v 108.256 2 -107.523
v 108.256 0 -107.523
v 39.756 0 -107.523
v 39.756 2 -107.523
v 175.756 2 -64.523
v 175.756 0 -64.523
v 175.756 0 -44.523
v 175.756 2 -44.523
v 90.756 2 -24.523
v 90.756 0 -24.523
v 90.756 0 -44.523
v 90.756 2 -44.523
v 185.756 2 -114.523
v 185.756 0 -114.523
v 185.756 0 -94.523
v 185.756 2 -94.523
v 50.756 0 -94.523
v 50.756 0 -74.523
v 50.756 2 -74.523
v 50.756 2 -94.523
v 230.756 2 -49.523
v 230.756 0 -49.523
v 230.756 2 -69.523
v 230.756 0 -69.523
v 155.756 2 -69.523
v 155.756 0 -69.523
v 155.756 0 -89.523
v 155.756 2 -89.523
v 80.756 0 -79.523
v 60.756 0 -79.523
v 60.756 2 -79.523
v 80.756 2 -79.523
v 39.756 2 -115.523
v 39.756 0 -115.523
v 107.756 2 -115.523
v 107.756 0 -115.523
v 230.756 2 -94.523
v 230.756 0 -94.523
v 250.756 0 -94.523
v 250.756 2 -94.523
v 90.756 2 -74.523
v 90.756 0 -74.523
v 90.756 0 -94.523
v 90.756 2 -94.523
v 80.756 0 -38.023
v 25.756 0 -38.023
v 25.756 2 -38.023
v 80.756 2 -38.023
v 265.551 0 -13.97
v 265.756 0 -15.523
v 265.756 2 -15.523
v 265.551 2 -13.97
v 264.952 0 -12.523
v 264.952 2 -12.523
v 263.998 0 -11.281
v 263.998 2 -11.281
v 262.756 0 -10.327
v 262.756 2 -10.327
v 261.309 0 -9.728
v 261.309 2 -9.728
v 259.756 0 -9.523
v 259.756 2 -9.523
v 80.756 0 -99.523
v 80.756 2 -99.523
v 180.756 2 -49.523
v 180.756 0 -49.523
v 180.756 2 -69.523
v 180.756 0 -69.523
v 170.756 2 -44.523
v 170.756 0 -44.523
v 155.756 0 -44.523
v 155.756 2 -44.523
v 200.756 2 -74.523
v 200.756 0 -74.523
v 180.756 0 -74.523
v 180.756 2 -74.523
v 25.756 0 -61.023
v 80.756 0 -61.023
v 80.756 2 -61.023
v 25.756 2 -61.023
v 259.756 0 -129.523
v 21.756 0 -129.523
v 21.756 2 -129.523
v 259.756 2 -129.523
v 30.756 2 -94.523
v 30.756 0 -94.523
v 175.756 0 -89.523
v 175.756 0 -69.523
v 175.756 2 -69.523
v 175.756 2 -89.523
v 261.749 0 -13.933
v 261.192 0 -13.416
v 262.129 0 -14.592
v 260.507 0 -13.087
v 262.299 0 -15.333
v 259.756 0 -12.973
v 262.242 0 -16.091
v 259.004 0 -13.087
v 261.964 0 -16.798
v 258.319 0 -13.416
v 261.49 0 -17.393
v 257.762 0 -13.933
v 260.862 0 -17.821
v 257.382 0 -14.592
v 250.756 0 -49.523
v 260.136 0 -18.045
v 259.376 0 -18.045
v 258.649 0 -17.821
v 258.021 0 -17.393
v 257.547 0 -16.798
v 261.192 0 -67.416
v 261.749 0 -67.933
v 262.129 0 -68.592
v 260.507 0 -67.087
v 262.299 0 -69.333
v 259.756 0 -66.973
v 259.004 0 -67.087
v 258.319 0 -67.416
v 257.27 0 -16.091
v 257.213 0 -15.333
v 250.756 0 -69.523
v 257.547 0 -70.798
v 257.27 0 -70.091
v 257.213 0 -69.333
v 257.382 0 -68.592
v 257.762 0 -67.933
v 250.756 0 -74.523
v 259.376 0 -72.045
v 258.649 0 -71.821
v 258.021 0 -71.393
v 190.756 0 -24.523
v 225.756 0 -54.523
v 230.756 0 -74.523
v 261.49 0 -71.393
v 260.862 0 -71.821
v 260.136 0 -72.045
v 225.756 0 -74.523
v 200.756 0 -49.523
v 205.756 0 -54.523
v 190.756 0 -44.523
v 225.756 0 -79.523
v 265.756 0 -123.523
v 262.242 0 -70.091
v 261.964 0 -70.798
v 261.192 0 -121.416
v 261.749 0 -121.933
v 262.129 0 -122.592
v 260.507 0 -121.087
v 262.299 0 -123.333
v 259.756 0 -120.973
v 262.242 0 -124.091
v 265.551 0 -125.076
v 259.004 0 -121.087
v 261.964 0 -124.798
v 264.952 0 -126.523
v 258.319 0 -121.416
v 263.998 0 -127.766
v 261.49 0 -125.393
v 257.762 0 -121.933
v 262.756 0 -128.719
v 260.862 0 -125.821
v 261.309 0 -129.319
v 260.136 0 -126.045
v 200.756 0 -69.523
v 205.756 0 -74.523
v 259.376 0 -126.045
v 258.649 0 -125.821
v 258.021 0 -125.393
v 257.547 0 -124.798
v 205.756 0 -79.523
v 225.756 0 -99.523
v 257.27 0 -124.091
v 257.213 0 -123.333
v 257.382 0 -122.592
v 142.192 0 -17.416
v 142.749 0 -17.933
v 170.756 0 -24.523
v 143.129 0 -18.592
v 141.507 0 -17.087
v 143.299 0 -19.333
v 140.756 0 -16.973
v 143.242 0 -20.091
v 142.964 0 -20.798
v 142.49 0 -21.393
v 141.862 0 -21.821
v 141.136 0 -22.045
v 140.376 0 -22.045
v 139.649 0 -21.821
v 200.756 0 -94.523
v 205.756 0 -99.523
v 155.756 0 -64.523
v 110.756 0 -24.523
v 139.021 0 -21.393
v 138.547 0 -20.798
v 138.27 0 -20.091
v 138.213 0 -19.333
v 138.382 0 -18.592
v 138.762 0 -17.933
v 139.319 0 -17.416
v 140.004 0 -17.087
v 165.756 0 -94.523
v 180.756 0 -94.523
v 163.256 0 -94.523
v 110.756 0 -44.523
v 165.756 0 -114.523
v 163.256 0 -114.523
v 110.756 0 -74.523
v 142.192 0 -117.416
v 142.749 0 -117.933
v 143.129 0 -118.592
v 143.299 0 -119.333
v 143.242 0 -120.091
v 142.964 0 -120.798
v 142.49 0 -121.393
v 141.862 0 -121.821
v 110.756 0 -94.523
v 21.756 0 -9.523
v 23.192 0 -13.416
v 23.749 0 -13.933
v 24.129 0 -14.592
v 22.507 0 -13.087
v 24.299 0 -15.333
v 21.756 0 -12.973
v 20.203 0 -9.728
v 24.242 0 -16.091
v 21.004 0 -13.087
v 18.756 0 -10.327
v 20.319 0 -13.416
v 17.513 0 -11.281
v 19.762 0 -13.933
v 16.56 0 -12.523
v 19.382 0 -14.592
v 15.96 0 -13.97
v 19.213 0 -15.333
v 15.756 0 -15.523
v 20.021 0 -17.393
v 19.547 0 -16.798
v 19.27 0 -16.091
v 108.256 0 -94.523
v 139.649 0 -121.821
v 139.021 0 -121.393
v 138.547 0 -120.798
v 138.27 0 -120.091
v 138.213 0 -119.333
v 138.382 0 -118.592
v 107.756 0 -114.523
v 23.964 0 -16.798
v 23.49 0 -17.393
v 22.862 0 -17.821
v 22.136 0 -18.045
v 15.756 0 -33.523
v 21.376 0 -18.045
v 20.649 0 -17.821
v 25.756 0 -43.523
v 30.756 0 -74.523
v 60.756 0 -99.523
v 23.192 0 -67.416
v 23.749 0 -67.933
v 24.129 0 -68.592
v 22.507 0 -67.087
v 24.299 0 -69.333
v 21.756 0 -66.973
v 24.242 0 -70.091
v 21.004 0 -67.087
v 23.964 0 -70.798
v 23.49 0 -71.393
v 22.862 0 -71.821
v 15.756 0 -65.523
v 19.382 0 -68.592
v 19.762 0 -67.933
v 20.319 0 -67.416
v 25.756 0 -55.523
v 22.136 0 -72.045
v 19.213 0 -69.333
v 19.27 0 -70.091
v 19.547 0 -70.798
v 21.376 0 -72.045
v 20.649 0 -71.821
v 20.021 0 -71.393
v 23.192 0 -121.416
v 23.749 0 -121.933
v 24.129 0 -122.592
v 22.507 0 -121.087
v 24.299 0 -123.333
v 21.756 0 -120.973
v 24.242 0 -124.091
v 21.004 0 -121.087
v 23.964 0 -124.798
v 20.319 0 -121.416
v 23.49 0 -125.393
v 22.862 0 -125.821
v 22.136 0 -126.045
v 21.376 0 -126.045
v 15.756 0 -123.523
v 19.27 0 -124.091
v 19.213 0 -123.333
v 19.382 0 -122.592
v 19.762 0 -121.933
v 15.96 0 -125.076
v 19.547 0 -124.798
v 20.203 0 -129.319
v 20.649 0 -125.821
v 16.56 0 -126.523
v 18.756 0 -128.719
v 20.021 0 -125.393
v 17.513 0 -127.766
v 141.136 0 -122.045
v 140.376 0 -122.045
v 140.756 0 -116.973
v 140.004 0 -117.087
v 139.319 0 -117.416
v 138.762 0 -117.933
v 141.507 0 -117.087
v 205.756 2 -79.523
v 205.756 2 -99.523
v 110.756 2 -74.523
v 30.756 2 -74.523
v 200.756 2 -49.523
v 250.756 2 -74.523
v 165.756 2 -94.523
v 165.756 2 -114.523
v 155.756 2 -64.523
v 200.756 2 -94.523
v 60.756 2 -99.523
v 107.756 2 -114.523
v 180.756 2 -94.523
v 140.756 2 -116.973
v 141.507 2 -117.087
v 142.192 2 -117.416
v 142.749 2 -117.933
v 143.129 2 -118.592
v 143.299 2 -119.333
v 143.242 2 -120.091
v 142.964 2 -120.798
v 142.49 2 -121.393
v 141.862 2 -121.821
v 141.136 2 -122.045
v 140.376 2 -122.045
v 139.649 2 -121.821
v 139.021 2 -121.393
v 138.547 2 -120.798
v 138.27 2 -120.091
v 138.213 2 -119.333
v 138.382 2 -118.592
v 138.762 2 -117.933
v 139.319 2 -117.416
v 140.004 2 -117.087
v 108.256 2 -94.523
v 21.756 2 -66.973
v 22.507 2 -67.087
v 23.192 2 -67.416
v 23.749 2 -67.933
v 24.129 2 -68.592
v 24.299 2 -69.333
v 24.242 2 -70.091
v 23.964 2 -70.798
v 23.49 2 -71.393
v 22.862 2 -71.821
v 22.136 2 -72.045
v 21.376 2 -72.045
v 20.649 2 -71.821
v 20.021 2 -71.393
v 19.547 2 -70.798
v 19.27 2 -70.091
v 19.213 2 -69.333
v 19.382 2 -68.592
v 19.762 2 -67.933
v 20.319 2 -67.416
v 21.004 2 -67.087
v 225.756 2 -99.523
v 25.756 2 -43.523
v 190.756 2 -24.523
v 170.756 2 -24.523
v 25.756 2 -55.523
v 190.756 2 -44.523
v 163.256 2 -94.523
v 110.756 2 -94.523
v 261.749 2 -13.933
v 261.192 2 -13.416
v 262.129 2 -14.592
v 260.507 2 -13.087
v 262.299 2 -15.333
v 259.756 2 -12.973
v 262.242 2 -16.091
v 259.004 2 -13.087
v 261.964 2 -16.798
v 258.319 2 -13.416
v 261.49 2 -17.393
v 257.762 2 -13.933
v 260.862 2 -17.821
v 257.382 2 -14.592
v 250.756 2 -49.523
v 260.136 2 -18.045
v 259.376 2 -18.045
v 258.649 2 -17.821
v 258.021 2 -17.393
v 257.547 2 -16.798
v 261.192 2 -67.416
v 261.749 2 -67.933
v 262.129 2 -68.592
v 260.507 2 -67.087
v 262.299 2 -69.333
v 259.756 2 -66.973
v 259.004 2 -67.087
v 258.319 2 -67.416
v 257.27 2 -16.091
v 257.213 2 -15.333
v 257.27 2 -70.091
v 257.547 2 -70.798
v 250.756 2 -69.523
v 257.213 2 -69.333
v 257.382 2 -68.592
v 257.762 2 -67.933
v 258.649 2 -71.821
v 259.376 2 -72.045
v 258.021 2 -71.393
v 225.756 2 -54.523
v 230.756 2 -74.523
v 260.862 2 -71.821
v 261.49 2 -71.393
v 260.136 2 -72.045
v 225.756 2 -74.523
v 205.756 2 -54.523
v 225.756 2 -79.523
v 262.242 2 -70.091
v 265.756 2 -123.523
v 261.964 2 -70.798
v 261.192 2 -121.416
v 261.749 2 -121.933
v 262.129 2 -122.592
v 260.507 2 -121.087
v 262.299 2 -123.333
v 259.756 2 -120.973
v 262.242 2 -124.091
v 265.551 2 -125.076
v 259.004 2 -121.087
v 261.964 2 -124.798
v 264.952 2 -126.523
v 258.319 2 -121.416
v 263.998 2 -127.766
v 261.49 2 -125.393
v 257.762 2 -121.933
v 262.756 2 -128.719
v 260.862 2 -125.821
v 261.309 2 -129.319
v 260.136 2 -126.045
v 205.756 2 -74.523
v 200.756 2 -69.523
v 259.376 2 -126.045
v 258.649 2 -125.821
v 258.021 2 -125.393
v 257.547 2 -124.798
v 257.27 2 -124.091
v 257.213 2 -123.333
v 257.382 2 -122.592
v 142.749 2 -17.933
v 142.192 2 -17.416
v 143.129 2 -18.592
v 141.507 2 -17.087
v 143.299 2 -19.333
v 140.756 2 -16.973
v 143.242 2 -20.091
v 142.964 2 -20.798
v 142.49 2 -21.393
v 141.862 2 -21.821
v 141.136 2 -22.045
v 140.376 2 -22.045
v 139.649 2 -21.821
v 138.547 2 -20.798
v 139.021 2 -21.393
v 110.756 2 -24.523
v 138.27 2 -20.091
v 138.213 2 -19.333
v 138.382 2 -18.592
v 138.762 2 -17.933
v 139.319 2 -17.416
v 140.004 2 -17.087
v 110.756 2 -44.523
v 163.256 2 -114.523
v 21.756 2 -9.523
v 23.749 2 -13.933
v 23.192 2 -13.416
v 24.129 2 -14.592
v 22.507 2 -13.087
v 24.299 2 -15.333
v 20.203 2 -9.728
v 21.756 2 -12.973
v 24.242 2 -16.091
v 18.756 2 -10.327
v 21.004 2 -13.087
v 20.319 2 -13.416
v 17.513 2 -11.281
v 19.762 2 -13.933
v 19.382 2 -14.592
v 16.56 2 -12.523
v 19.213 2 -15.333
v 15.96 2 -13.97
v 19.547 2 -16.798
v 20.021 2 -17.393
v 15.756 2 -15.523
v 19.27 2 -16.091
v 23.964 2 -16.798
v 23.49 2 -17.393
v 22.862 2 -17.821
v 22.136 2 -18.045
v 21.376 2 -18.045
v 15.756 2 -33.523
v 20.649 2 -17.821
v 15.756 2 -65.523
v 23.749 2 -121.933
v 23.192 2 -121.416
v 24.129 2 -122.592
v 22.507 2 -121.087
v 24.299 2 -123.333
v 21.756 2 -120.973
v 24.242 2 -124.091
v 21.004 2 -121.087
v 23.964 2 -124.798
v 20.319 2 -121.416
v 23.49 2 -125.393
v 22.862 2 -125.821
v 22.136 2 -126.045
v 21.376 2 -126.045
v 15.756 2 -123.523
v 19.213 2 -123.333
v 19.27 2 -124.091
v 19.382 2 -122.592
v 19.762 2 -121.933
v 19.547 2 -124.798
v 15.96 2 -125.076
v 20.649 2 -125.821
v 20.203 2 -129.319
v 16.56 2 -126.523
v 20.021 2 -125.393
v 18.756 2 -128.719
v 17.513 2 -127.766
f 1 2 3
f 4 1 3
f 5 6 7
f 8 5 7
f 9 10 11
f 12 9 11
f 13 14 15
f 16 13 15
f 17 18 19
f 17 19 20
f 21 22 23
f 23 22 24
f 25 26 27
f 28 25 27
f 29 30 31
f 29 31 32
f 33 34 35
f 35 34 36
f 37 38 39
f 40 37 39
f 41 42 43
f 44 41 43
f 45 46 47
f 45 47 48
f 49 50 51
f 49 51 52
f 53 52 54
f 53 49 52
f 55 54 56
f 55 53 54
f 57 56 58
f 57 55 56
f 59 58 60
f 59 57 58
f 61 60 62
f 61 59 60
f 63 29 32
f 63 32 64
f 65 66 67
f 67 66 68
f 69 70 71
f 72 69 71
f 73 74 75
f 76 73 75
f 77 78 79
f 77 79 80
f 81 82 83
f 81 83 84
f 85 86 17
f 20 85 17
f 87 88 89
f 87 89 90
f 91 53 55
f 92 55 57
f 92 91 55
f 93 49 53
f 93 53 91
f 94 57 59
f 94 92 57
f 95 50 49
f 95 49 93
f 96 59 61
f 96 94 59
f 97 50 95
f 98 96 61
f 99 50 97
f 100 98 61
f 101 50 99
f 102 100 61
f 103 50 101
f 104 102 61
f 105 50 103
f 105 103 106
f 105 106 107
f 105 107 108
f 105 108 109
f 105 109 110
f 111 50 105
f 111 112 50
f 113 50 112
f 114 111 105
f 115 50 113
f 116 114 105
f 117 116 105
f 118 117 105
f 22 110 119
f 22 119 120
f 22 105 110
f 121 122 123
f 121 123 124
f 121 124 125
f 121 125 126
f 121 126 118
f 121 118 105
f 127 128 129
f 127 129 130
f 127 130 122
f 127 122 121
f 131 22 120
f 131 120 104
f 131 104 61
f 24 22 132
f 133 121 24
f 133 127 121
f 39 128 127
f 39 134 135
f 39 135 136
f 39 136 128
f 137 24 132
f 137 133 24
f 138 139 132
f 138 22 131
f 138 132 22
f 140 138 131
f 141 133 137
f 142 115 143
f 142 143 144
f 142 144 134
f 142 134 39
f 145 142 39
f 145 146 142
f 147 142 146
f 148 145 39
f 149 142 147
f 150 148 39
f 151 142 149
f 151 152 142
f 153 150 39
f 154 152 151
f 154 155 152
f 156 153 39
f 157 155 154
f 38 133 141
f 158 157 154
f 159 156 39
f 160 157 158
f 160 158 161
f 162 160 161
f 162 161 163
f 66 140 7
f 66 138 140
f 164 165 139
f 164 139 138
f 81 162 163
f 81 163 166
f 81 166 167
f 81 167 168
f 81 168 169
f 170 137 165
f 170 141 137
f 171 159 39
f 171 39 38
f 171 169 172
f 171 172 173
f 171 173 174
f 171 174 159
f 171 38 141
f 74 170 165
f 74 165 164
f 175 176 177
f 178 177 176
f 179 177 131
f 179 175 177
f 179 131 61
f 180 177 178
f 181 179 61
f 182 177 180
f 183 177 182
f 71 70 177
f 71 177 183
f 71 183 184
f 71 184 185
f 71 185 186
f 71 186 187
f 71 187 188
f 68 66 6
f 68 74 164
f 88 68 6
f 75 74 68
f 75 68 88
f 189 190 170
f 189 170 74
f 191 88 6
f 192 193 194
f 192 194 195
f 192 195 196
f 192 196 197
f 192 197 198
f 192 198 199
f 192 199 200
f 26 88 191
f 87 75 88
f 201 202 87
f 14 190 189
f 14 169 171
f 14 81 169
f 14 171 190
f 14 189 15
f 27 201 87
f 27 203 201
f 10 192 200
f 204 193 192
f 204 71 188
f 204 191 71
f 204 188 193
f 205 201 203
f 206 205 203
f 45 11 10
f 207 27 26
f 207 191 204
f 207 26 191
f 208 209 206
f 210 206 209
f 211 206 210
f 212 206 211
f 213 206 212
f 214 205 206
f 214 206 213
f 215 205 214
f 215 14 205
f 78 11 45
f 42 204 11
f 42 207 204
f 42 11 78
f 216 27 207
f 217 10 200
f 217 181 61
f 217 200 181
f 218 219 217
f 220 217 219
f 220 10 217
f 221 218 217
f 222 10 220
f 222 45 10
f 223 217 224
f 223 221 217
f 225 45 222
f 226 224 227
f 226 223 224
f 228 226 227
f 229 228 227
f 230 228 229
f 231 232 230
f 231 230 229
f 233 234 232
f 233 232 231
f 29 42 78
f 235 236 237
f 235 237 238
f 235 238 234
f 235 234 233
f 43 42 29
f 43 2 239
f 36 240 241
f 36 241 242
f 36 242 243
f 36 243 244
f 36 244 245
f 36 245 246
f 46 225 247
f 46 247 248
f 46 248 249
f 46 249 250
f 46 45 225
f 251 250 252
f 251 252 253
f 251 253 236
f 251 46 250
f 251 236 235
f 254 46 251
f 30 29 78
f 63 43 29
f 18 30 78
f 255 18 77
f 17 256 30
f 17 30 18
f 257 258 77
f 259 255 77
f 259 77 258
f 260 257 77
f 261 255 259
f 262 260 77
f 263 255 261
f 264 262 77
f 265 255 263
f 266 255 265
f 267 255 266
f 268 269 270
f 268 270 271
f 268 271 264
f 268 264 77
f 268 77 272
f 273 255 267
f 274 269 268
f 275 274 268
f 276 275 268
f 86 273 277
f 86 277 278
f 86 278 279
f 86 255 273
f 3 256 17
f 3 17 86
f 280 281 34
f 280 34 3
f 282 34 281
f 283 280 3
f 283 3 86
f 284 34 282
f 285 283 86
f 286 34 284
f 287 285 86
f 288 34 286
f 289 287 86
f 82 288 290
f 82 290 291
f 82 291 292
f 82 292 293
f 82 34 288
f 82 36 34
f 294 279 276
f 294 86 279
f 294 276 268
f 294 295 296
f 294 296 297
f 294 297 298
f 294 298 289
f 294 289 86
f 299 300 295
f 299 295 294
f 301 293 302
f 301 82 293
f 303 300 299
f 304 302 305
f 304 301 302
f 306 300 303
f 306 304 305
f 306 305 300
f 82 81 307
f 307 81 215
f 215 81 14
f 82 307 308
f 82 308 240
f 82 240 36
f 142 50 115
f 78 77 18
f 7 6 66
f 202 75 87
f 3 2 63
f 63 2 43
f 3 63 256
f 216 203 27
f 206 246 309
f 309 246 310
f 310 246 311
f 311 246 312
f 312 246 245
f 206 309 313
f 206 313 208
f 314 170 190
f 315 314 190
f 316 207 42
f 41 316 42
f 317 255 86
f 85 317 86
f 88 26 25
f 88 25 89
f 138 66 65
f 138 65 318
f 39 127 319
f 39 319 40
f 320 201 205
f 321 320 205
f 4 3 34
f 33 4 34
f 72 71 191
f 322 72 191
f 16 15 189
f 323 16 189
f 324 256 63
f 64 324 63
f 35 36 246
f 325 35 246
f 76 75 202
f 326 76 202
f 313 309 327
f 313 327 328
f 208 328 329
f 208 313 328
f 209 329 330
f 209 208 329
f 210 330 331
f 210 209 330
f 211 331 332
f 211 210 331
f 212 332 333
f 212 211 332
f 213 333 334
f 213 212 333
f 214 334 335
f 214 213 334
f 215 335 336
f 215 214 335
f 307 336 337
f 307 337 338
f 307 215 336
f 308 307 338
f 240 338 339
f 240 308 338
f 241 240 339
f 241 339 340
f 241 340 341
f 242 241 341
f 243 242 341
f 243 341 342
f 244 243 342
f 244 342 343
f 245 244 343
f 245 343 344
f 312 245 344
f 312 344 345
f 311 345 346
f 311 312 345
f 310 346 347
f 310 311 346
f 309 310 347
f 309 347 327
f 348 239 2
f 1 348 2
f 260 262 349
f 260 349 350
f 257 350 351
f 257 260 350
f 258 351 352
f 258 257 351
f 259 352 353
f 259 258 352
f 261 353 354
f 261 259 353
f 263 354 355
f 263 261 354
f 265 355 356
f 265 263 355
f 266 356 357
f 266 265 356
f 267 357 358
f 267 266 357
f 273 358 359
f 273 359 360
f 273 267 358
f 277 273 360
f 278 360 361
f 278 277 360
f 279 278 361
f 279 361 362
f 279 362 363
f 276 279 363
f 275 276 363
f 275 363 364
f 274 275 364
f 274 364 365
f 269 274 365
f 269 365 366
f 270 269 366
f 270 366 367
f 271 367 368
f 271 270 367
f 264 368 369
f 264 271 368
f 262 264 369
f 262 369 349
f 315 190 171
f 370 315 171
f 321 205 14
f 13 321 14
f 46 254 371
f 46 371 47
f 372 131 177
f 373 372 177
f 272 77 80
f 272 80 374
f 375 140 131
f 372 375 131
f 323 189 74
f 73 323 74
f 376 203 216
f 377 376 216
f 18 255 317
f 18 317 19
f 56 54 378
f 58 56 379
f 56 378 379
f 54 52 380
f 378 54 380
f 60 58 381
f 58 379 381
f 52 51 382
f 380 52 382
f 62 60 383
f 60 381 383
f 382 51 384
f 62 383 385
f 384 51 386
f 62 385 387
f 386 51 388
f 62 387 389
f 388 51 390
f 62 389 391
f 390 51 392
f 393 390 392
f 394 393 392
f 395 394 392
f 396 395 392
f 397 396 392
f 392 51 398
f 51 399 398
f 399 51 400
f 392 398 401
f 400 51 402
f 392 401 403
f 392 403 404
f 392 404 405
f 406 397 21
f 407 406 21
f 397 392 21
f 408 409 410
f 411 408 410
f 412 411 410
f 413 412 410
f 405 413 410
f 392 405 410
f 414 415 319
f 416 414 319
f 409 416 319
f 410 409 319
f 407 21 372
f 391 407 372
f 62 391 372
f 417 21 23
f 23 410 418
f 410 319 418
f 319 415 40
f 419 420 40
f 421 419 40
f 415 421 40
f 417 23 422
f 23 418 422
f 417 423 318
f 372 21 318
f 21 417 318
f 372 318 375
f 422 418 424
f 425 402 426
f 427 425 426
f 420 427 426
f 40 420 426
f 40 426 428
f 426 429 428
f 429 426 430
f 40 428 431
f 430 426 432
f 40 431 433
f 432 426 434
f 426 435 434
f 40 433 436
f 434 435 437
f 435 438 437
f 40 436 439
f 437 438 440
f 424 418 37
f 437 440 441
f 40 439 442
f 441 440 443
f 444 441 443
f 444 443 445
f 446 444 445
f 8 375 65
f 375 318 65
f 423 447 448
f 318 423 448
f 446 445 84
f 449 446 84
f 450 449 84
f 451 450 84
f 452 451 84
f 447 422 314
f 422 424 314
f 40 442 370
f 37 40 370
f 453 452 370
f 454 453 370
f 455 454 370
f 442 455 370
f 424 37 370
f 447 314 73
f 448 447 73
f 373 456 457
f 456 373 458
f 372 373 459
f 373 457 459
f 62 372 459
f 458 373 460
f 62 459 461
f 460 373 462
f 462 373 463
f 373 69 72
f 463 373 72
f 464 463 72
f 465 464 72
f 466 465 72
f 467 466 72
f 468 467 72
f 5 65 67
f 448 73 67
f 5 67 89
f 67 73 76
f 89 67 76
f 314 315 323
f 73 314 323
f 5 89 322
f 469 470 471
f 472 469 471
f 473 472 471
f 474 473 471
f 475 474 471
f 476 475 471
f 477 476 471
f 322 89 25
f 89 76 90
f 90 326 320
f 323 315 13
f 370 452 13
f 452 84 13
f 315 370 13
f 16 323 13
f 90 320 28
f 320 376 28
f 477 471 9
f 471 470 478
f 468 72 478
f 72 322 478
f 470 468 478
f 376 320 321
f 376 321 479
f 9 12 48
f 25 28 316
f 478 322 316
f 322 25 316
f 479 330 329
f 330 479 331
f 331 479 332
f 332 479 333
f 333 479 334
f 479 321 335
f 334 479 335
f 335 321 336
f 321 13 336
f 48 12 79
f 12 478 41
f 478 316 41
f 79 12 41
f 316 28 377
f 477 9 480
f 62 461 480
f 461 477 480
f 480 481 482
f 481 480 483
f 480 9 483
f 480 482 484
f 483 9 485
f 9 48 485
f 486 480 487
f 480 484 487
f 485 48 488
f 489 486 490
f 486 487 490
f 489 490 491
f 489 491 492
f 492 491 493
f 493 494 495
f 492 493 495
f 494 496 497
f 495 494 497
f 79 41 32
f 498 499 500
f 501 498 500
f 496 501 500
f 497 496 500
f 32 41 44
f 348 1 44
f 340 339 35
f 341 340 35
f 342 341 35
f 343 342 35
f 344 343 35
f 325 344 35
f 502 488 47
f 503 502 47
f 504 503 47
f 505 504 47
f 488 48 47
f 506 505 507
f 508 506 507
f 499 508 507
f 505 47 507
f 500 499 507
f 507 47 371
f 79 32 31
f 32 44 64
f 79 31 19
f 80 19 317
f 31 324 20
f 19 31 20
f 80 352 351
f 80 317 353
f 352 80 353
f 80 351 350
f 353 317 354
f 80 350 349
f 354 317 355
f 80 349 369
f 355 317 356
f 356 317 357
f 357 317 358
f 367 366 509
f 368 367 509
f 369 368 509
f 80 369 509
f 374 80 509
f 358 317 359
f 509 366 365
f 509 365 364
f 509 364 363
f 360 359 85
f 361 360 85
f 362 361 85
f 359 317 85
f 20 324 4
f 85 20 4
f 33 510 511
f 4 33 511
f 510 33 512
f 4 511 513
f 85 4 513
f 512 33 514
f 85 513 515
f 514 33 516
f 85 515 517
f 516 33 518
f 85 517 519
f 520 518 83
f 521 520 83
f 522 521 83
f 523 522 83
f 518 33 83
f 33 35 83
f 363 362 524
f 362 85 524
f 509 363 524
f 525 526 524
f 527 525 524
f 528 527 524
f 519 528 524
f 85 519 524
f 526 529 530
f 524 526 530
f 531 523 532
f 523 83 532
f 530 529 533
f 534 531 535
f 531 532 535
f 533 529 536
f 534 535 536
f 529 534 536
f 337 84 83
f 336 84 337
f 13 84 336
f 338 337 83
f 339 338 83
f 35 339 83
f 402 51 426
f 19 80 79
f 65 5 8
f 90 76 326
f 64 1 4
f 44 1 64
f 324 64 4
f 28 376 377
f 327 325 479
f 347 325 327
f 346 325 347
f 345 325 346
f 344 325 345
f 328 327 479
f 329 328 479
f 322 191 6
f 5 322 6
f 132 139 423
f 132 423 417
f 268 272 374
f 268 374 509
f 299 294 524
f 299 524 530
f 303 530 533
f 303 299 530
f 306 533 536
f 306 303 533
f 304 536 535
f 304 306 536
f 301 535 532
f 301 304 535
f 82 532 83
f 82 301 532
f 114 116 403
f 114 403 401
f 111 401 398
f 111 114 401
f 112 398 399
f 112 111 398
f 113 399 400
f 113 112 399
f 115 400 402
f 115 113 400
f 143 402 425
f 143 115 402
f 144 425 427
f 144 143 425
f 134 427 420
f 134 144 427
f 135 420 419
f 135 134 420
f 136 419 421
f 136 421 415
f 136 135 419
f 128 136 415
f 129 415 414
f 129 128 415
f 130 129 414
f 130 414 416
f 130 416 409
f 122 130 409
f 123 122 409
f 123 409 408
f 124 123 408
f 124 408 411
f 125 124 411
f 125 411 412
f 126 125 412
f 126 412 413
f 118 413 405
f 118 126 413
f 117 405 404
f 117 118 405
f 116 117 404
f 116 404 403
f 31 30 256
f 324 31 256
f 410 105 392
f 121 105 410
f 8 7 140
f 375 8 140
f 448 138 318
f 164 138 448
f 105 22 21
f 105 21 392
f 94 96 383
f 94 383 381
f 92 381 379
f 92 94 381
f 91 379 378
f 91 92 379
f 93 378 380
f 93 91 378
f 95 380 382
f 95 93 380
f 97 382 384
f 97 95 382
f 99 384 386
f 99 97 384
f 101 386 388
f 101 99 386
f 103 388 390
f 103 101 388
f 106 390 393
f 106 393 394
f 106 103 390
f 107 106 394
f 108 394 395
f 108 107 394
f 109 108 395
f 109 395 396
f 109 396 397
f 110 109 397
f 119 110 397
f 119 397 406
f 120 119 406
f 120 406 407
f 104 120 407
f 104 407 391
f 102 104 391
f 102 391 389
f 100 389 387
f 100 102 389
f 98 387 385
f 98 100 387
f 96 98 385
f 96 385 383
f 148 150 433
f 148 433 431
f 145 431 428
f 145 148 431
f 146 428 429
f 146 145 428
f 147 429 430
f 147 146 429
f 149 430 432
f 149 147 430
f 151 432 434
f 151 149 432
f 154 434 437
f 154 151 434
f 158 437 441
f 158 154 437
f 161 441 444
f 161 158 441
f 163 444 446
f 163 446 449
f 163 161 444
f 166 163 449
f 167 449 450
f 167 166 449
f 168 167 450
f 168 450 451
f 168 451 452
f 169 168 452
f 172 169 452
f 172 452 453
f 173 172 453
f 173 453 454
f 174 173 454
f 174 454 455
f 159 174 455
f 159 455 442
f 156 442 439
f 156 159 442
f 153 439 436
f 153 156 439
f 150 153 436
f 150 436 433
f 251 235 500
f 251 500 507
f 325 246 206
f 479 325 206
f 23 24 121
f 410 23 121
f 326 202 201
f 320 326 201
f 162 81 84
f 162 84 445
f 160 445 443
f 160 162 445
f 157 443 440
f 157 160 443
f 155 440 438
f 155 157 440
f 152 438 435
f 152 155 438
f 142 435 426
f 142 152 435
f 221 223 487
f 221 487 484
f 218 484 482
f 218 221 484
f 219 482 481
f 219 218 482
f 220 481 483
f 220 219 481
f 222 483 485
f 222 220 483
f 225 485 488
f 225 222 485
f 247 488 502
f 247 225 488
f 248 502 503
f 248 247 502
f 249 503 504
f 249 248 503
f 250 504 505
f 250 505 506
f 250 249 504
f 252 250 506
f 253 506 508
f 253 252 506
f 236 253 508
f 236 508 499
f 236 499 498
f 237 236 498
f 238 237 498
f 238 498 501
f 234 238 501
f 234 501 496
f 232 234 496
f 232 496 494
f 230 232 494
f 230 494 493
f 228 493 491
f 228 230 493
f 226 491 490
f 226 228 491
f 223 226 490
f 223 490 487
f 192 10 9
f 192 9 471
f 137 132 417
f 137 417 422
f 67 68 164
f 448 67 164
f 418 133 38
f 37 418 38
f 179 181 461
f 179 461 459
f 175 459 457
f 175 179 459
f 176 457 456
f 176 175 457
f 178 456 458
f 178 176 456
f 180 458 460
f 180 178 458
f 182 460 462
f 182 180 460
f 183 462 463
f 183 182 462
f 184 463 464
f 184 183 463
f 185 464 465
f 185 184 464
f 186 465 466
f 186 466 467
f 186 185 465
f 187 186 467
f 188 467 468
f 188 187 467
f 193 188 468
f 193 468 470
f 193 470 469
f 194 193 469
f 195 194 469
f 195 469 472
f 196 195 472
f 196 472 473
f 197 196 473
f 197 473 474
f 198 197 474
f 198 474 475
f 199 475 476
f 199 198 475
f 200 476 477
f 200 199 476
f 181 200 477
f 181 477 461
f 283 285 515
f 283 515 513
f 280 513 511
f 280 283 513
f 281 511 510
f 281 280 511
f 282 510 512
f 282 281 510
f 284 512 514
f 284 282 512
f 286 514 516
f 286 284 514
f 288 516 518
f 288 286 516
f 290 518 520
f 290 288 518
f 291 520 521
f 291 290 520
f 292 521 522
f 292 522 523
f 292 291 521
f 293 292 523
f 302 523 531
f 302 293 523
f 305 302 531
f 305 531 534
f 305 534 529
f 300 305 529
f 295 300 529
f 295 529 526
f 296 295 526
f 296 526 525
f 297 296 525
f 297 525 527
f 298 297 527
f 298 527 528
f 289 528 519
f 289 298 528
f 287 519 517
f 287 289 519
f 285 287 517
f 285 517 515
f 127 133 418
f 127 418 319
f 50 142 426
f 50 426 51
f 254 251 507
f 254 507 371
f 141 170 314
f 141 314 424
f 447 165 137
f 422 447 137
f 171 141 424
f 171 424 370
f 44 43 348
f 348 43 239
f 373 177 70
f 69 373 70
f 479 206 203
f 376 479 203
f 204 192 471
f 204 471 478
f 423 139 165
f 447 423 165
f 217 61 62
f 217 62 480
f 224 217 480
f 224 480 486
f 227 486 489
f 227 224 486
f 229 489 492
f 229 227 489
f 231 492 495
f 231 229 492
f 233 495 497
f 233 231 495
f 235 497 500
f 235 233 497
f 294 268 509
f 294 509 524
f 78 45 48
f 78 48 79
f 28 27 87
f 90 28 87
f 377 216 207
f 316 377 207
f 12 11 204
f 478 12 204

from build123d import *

# Parameters (mm, degrees)
SKETCH_1_R      = 2.55
SKETCH_1_W      = 20
SKETCH_1_H      = 20
EXTRUDE_1_DEPTH = 2


with BuildPart() as part:
    # 草图1 → 凸台-拉伸1 (new body)
    with BuildSketch(Plane(origin=(0, 0, 0), x_dir=(1, 0, 0), z_dir=(0, 1, 0))):
        with BuildLine():
            Line((15.755708479, 65.523244106), (15.755708479, 123.523244106))
            ThreePointArc((15.755708479, 123.523244106), (17.513067792, 127.765884793), (21.755708479, 129.523244106))
            Line((21.755708479, 129.523244106), (259.755708479, 129.523244106))
            ThreePointArc((259.755708479, 129.523244106), (263.998349166, 127.765884793), (265.755708479, 123.523244106))
            Line((265.755708479, 123.523244106), (265.755708479, 15.523244106))
            ThreePointArc((265.755708479, 15.523244106), (263.998349166, 11.280603419), (259.755708479, 9.523244106))
            Line((259.755708479, 9.523244106), (21.755708479, 9.523244106))
            ThreePointArc((21.755708479, 9.523244106), (17.513067792, 11.280603419), (15.755708479, 15.523244106))
            Line((15.755708479, 15.523244106), (15.755708479, 33.523244106))
            Line((15.755708479, 33.523244106), (25.755708479, 43.523244106))
            Line((25.755708479, 43.523244106), (25.755708479, 38.023244106))
            Line((25.755708479, 38.023244106), (80.755708479, 38.023244106))
            Line((80.755708479, 38.023244106), (80.755708479, 61.023244106))
            Line((80.755708479, 61.023244106), (25.755708479, 61.023244106))
            Line((25.755708479, 61.023244106), (25.755708479, 55.523244106))
            Line((25.755708479, 55.523244106), (15.755708479, 65.523244106))
        make_face()
        with Locations(Location((21.755708479, 123.523244106, 0), (0, 0, 270))):
            Circle(SKETCH_1_R, mode=Mode.SUBTRACT)
        with Locations(Location((259.755708479, 123.523244106, 0), (0, 0, 270))):
            Circle(SKETCH_1_R, mode=Mode.SUBTRACT)
        with Locations(Location((140.755708479, 119.523244106, 0), (0, 0, 270))):
            Circle(SKETCH_1_R, mode=Mode.SUBTRACT)
        with Locations(Location((21.755708479, 15.523244106, 0), (0, 0, 270))):
            Circle(SKETCH_1_R, mode=Mode.SUBTRACT)
        with Locations(Location((259.755708479, 15.523244106, 0), (0, 0, 270))):
            Circle(SKETCH_1_R, mode=Mode.SUBTRACT)
        with Locations(Location((140.755708479, 19.523244106, 0), (0, 0, 270))):
            Circle(SKETCH_1_R, mode=Mode.SUBTRACT)
        with Locations(Location((259.755708479, 69.523244106, 0), (0, 0, 270))):
            Circle(SKETCH_1_R, mode=Mode.SUBTRACT)
        with Locations(Location((21.755708479, 69.523244106, 0), (0, 0, 270))):
            Circle(SKETCH_1_R, mode=Mode.SUBTRACT)
        Polygon((107.755708479, 107.523244106), (39.755708479, 107.523244106), (39.755708479, 115.523244106), (107.755708479, 115.523244106), (107.755708479, 114.523244106), (108.255708479, 114.523244106), (163.255708479, 114.523244106), (163.255708479, 94.523244106), (110.755708479, 94.523244106), (110.755708479, 74.523244106), (90.755708479, 74.523244106), (90.755708479, 94.523244106), (108.255708479, 94.523244106), (108.255708479, 107.523244106), align=None, mode=Mode.SUBTRACT)
        with Locations((70.755708479, 89.523244106)):
            Rectangle(SKETCH_1_W, SKETCH_1_H, mode=Mode.SUBTRACT)
        with Locations((100.755708479, 34.523244106)):
            Rectangle(SKETCH_1_W, SKETCH_1_H, mode=Mode.SUBTRACT)
        with Locations((40.755708479, 84.523244106)):
            Rectangle(SKETCH_1_W, SKETCH_1_H, mode=Mode.SUBTRACT)
        Polygon((180.755708479, 94.523244106), (165.755708479, 94.523244106), (165.755708479, 114.523244106), (185.755708479, 114.523244106), (185.755708479, 94.523244106), (200.755708479, 94.523244106), (200.755708479, 74.523244106), (180.755708479, 74.523244106), align=None, mode=Mode.SUBTRACT)
        with Locations((165.755708479, 79.523244106)):
            Rectangle(SKETCH_1_W, SKETCH_1_H, mode=Mode.SUBTRACT)
        with Locations((215.755708479, 89.523244106)):
            Rectangle(SKETCH_1_W, SKETCH_1_H, mode=Mode.SUBTRACT)
        with Locations((240.755708479, 84.523244106)):
            Rectangle(SKETCH_1_W, SKETCH_1_H, mode=Mode.SUBTRACT)
        Polygon((170.755708479, 44.523244106), (155.755708479, 44.523244106), (155.755708479, 64.523244106), (175.755708479, 64.523244106), (175.755708479, 44.523244106), (190.755708479, 44.523244106), (190.755708479, 24.523244106), (170.755708479, 24.523244106), align=None, mode=Mode.SUBTRACT)
        with Locations((190.755708479, 59.523244106)):
            Rectangle(SKETCH_1_W, SKETCH_1_H, mode=Mode.SUBTRACT)
        with Locations((215.755708479, 64.523244106)):
            Rectangle(SKETCH_1_W, SKETCH_1_H, mode=Mode.SUBTRACT)
        with Locations((240.755708479, 59.523244106)):
            Rectangle(SKETCH_1_W, SKETCH_1_H, mode=Mode.SUBTRACT)
    extrude(amount=EXTRUDE_1_DEPTH)


solid = part.part
